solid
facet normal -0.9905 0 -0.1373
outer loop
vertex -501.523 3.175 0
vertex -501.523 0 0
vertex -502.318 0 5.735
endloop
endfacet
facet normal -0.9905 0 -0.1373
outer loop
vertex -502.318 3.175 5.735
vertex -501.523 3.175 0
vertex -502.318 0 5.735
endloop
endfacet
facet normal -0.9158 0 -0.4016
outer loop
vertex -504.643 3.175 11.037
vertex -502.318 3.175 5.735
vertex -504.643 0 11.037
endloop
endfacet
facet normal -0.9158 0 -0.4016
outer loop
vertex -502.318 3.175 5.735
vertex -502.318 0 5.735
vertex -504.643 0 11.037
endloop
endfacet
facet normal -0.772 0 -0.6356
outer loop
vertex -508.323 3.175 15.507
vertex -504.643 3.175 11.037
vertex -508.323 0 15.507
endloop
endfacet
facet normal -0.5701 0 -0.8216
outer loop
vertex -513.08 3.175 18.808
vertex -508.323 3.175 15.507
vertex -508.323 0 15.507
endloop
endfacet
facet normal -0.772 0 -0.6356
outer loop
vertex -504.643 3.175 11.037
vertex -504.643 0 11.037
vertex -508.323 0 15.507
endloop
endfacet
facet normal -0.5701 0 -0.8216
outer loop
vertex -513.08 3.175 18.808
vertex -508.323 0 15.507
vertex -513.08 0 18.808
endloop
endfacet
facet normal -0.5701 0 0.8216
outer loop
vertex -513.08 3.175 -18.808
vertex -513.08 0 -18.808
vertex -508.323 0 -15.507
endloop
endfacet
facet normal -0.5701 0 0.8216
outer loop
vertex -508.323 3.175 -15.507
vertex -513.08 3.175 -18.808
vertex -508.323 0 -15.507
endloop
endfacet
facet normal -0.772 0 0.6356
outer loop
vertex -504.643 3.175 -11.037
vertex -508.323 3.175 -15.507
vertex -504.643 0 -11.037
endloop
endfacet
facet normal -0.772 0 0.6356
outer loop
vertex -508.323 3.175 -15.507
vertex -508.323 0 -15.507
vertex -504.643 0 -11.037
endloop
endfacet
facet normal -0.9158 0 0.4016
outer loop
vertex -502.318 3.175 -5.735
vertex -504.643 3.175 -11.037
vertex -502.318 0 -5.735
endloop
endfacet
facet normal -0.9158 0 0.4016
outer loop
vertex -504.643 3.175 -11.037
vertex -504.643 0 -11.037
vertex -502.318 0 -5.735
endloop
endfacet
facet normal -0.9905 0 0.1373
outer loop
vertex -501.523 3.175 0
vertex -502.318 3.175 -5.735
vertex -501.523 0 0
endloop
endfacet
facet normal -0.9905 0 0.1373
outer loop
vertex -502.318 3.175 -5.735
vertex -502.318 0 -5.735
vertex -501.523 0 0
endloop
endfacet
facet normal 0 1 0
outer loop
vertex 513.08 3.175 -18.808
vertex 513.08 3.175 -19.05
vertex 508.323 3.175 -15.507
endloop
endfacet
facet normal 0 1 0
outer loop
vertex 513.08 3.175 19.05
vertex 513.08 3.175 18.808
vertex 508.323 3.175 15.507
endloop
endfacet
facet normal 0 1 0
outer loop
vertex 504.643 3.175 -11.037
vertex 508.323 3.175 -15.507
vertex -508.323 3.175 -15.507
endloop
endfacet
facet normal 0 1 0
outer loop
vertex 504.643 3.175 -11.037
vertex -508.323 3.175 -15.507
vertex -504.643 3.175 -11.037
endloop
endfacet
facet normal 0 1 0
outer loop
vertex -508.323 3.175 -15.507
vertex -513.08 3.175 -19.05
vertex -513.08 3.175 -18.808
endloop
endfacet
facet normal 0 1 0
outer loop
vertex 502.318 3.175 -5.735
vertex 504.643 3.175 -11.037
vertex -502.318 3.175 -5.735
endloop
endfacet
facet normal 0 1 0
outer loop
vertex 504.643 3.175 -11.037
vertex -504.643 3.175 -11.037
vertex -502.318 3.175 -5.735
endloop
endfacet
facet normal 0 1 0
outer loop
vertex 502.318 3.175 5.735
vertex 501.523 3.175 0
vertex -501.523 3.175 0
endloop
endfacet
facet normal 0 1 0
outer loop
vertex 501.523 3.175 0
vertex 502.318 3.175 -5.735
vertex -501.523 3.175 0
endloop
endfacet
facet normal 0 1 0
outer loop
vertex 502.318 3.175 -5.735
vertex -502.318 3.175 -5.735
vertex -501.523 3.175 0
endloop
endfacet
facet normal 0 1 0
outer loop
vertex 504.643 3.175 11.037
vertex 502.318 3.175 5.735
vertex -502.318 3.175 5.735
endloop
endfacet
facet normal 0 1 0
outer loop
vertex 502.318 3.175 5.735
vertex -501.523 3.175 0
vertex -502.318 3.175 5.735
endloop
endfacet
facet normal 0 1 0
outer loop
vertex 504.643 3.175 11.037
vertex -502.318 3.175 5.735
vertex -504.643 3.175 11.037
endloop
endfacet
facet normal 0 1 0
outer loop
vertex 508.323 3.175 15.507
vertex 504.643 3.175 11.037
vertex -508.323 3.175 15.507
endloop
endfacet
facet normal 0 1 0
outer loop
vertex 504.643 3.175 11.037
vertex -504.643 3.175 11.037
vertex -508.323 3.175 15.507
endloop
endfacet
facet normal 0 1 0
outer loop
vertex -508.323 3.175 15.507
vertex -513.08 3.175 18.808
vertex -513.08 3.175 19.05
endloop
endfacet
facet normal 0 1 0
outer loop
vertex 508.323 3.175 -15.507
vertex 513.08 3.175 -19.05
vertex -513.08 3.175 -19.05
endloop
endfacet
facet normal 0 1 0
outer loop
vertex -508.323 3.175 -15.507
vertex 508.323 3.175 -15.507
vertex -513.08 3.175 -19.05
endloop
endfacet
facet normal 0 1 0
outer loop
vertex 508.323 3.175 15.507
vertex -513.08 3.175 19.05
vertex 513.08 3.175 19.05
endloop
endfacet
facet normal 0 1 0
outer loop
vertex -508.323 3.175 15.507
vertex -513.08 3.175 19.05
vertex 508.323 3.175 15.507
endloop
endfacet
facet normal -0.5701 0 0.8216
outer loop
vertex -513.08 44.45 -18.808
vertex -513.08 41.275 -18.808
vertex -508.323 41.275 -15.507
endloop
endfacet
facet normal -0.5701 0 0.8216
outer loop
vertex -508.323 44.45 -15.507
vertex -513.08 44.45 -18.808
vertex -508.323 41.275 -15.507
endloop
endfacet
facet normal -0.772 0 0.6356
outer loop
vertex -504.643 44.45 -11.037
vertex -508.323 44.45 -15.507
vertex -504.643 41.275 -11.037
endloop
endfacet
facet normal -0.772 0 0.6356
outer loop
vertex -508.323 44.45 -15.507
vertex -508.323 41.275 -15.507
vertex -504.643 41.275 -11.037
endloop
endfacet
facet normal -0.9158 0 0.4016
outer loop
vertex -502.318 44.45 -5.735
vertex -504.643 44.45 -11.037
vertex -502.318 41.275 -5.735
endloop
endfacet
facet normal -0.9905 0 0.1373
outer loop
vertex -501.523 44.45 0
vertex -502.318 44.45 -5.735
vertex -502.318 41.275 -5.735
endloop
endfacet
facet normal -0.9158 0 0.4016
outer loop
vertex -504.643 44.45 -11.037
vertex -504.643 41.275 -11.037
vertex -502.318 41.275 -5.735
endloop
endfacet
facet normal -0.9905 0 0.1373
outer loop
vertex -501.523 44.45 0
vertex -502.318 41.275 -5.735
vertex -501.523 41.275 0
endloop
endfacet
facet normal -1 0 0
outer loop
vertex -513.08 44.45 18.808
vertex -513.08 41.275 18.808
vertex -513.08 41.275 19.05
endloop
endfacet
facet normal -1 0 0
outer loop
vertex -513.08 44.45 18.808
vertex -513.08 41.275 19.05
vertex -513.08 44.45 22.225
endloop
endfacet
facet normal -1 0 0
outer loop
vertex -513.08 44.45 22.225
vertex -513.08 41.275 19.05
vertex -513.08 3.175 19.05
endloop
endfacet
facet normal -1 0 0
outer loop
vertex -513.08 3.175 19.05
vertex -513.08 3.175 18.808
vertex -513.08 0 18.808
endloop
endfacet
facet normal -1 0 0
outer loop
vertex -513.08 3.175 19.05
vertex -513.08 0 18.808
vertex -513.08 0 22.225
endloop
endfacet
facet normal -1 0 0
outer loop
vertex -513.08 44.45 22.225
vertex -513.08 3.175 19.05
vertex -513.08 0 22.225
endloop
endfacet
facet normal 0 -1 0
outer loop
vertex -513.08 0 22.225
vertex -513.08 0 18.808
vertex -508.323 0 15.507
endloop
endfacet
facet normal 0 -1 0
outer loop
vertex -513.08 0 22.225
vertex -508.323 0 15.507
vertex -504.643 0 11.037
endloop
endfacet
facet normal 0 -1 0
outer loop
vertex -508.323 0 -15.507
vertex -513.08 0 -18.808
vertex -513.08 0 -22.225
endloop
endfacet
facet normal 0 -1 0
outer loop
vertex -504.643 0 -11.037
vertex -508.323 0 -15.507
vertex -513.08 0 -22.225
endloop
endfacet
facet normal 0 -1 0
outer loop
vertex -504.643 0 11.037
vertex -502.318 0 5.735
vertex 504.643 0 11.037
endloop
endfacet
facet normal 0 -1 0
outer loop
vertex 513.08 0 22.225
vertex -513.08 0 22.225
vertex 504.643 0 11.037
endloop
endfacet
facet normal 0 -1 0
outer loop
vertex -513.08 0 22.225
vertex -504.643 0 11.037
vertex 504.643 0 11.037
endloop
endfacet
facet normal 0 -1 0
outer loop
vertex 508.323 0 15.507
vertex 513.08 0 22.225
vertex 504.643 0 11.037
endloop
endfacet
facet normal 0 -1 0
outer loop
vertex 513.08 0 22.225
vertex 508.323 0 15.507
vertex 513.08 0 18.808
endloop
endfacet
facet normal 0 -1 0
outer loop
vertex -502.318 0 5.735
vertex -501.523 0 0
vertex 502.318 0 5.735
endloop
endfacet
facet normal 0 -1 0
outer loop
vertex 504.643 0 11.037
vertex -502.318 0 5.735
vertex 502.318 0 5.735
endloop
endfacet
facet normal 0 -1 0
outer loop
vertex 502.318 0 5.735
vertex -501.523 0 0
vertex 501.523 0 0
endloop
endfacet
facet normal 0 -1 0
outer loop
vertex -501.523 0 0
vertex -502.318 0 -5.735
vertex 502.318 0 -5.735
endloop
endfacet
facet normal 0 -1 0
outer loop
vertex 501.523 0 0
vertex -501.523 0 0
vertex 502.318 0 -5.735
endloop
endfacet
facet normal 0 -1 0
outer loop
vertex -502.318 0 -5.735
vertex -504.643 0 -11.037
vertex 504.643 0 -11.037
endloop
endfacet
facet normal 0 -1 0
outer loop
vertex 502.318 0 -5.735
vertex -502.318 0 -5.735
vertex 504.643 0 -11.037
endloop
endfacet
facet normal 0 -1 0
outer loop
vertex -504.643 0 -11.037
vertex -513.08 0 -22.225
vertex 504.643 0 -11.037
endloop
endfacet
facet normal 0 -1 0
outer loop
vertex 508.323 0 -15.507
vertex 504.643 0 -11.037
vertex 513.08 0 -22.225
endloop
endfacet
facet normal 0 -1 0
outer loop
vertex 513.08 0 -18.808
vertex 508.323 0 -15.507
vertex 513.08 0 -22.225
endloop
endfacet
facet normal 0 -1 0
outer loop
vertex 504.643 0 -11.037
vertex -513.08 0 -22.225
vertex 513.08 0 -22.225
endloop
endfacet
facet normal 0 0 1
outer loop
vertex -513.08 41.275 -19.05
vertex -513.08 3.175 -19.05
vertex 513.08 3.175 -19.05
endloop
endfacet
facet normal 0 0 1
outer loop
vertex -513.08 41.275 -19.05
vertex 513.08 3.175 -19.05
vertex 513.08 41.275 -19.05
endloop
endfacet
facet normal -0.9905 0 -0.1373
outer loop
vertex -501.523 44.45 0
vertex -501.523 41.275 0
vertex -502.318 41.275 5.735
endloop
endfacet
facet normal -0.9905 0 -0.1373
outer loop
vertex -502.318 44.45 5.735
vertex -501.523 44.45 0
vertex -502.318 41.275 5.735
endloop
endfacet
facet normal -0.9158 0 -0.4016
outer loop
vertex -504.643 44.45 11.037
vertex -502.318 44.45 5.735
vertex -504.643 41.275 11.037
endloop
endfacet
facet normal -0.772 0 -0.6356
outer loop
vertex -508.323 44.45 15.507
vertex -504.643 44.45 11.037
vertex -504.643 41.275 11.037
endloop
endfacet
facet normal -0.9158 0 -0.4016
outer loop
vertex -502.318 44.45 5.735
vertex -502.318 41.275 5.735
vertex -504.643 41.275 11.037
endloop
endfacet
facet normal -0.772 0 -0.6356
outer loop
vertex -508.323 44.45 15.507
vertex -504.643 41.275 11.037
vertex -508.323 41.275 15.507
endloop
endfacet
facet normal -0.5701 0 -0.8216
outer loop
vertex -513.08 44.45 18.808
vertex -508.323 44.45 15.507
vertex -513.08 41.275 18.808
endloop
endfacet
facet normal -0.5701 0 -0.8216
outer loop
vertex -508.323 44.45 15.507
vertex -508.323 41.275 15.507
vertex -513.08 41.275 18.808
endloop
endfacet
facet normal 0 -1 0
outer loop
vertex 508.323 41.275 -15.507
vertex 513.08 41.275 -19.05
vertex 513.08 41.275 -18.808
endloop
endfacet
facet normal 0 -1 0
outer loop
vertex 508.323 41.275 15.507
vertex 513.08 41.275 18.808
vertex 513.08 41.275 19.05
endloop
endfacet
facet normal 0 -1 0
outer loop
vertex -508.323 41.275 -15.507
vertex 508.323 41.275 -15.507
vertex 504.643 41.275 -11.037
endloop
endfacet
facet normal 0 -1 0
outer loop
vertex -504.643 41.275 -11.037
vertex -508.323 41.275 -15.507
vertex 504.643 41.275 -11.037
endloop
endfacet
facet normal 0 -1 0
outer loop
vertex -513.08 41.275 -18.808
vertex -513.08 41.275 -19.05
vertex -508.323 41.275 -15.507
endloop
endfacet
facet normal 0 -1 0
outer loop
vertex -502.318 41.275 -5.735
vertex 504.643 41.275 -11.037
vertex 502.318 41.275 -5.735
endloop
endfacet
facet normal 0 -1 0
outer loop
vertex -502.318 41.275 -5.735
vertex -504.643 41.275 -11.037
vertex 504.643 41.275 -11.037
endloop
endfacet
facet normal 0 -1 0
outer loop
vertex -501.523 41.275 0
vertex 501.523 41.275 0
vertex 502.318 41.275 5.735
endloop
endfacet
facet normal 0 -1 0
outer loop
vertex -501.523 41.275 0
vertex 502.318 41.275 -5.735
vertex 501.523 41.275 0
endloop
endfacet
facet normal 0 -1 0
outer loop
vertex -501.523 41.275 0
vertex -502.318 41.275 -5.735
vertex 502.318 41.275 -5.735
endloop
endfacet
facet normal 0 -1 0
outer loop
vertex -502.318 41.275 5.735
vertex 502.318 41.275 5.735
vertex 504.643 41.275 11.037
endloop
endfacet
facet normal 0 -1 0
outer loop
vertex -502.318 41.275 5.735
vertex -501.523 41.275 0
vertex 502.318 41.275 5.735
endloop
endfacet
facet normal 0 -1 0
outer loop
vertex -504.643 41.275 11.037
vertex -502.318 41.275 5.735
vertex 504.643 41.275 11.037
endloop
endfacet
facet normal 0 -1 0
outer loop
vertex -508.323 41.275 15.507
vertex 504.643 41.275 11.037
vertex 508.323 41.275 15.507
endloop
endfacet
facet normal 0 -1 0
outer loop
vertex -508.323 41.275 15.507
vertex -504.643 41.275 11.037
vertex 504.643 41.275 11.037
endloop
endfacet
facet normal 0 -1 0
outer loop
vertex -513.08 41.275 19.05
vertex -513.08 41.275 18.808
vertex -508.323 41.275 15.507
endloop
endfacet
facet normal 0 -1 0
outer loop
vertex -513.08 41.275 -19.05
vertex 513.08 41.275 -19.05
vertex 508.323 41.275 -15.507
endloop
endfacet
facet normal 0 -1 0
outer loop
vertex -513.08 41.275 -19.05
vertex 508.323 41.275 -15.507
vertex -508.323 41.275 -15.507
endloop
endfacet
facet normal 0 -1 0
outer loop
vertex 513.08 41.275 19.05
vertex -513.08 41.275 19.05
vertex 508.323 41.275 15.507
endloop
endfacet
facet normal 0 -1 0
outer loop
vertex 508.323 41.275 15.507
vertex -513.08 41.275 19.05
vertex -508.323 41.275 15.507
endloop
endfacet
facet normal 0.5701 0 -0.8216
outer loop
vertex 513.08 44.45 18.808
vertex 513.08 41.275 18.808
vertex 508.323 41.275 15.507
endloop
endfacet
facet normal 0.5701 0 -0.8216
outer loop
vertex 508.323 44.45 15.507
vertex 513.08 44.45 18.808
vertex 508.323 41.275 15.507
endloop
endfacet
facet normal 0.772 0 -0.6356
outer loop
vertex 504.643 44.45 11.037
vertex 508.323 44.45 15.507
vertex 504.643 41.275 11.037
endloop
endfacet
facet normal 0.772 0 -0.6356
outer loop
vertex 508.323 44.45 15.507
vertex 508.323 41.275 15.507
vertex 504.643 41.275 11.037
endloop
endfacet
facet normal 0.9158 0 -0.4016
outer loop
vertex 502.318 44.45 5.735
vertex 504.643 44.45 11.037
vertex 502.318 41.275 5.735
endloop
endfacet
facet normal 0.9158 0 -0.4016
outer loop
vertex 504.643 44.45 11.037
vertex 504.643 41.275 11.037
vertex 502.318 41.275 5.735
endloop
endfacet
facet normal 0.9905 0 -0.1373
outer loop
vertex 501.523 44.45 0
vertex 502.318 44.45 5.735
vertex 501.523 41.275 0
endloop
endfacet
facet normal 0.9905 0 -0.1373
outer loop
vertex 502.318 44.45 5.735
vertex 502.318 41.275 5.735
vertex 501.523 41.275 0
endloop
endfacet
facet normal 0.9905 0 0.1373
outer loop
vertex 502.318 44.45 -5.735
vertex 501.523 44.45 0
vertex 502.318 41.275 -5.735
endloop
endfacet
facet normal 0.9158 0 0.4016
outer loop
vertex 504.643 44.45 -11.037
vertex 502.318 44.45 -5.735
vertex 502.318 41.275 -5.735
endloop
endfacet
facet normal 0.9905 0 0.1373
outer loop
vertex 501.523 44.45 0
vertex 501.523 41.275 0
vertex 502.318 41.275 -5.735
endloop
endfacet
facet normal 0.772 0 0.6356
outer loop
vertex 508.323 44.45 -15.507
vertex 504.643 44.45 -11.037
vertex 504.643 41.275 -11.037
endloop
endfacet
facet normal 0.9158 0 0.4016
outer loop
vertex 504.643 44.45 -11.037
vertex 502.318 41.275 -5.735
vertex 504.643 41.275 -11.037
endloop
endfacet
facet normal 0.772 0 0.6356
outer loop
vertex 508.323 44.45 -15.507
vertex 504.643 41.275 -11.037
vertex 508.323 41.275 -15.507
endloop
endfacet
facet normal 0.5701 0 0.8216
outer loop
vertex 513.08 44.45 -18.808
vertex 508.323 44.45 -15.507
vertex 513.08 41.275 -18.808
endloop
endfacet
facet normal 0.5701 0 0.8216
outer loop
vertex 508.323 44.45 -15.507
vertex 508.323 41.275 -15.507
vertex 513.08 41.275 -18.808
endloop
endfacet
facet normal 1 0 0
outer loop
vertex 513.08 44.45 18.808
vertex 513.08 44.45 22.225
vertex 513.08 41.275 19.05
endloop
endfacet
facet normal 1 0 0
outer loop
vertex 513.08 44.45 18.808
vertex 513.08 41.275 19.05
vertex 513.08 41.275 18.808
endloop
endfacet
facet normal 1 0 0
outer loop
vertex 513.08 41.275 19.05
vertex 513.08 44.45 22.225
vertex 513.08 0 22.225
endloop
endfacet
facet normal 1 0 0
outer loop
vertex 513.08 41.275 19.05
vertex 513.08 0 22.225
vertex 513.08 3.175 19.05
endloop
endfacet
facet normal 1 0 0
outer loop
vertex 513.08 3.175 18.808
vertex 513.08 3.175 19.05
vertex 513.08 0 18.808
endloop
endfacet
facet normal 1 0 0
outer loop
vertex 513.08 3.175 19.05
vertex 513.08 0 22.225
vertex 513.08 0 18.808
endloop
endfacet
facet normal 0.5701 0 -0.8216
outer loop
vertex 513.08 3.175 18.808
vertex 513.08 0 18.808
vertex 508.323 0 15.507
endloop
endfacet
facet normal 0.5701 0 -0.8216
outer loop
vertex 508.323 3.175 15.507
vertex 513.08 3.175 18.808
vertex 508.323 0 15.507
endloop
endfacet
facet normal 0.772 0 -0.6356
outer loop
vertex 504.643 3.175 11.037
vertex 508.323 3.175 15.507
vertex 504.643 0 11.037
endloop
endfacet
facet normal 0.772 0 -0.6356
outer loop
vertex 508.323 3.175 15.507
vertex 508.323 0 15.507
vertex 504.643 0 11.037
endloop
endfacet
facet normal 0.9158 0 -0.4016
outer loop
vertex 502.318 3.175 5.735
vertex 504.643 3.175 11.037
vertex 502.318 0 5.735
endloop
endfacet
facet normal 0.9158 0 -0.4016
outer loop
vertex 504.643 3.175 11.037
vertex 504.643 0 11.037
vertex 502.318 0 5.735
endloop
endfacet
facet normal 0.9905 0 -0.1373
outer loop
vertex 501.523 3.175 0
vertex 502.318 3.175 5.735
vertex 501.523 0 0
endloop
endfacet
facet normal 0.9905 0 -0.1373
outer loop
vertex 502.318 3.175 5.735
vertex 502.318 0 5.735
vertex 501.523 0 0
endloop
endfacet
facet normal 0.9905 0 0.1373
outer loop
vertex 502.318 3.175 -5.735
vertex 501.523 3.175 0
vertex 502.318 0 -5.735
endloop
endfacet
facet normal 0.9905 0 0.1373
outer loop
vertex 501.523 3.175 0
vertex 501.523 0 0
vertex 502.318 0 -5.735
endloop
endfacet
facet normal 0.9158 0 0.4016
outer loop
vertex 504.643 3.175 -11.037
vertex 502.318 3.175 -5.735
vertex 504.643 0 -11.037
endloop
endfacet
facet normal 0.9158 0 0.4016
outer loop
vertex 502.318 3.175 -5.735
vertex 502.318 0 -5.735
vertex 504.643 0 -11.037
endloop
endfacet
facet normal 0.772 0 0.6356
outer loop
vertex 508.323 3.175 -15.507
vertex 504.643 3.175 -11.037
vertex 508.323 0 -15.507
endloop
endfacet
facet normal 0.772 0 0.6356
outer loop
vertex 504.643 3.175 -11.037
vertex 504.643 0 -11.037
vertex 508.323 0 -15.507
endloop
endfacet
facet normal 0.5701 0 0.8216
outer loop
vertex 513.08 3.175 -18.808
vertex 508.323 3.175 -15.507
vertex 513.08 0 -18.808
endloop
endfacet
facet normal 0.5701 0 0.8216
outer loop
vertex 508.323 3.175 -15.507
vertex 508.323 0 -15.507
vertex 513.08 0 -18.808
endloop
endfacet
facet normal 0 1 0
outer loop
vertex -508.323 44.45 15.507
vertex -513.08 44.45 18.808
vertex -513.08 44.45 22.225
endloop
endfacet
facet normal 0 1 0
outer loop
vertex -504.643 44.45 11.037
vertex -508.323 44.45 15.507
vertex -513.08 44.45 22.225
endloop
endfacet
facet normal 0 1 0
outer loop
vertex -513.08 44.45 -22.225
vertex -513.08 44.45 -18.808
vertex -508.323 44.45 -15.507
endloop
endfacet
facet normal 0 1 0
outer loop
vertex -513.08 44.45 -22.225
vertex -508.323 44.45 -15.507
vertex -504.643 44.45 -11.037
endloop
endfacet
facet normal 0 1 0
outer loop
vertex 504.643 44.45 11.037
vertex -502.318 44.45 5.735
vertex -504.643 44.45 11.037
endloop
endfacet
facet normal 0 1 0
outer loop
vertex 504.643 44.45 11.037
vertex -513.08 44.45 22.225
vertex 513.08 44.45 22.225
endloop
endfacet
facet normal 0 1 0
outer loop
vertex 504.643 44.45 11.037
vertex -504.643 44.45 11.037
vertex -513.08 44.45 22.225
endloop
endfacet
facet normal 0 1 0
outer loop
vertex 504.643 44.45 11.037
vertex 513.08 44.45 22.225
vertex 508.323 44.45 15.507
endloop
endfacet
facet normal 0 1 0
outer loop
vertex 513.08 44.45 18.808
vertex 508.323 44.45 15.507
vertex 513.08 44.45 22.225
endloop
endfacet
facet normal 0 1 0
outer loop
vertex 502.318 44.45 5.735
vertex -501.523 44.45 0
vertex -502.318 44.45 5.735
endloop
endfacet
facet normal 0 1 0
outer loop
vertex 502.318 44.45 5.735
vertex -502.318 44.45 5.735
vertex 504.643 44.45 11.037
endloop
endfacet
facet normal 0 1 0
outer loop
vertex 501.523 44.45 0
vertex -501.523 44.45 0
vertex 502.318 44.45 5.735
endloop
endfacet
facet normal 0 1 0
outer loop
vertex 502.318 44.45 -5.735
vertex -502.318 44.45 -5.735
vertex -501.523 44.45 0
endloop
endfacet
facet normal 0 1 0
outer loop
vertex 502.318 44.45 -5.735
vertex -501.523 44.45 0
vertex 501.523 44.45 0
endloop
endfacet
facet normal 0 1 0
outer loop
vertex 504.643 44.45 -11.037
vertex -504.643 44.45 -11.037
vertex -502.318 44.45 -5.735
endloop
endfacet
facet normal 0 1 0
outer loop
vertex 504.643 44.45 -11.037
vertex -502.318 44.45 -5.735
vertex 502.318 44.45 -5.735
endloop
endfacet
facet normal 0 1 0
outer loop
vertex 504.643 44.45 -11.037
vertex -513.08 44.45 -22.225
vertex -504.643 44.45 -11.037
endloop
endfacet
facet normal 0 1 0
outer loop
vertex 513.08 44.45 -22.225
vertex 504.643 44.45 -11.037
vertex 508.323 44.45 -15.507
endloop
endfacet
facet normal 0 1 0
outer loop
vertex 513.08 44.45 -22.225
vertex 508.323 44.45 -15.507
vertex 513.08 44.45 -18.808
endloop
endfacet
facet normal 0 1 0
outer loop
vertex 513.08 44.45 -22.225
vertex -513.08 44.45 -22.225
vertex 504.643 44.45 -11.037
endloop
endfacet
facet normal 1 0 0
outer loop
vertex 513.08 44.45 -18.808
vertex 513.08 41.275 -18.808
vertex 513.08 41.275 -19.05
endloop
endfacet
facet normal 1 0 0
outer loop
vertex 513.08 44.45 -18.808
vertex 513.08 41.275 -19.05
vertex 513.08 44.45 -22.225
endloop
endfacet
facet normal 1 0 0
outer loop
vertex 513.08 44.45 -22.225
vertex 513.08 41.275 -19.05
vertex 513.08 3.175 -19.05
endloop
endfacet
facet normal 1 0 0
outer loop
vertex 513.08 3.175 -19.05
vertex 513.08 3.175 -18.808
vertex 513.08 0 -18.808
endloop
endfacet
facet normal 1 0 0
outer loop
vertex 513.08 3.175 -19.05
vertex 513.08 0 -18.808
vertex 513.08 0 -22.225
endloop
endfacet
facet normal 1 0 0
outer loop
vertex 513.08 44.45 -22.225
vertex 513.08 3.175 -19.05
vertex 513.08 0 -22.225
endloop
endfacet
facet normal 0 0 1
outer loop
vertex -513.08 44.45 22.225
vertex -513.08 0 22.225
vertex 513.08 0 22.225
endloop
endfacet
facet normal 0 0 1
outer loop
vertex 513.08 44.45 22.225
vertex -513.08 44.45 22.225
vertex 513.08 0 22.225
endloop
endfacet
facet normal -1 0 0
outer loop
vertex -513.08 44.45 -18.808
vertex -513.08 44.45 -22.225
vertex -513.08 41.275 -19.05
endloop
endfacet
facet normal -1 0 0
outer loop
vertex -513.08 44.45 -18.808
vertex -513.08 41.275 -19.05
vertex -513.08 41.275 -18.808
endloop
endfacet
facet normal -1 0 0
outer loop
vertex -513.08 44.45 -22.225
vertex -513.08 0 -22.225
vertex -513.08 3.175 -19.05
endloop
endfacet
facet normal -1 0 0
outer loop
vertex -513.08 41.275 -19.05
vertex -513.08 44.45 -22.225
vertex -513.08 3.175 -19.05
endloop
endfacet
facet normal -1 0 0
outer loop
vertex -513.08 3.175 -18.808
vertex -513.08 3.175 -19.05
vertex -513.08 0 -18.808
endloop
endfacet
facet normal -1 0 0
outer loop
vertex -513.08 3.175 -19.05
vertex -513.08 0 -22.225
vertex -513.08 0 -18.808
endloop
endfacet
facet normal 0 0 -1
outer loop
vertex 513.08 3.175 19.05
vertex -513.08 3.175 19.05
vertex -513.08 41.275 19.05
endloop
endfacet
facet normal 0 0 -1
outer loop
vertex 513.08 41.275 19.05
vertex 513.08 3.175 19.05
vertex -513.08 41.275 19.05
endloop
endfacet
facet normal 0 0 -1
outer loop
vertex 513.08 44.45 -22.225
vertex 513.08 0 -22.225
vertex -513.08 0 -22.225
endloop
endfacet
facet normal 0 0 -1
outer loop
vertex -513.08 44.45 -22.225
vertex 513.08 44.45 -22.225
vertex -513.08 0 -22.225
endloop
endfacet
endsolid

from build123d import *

# Parameters (mm, degrees)
BOSS_EXTRUDE1_DEPTH = 44.45
SKETCH3_W           = 38.1
SKETCH3_H           = 38.1
CUT_EXTRUDE1_DEPTH  = 1027.16


with BuildPart() as part:
    # Sketch2 → Boss-Extrude1 (new body)
    with BuildSketch(Plane(origin=(0, 0, 0), x_dir=(1, 0, 0), z_dir=(0, 1, 0))):
        with BuildLine():
            Line((513.08, 18.807580892), (513.08, 22.225))
            Line((513.08, 22.225), (-513.08, 22.225))
            Line((-513.08, 22.225), (-513.08, 18.807580892))
            ThreePointArc((-513.08, 18.807580892), (-504.64314077, 11.037315661), (-501.523, 0))
            ThreePointArc((-501.523, 0), (-504.64314077, -11.037315661), (-513.08, -18.807580892))
            Line((-513.08, -18.807580892), (-513.08, -22.225))
            Line((-513.08, -22.225), (513.08, -22.225))
            Line((513.08, -22.225), (513.08, -18.807580892))
            ThreePointArc((513.08, -18.807580892), (501.523, 0), (513.08, 18.807580892))
        make_face()
    extrude(amount=BOSS_EXTRUDE1_DEPTH)

    # Sketch3 → Cut-Extrude1 (cut, through all)
    with BuildSketch(Plane.ZY.offset(513.08)):
        with Locations((0, 22.225)):
            Rectangle(SKETCH3_W, SKETCH3_H)
    extrude(amount=-CUT_EXTRUDE1_DEPTH, mode=Mode.SUBTRACT)


solid = part.part
